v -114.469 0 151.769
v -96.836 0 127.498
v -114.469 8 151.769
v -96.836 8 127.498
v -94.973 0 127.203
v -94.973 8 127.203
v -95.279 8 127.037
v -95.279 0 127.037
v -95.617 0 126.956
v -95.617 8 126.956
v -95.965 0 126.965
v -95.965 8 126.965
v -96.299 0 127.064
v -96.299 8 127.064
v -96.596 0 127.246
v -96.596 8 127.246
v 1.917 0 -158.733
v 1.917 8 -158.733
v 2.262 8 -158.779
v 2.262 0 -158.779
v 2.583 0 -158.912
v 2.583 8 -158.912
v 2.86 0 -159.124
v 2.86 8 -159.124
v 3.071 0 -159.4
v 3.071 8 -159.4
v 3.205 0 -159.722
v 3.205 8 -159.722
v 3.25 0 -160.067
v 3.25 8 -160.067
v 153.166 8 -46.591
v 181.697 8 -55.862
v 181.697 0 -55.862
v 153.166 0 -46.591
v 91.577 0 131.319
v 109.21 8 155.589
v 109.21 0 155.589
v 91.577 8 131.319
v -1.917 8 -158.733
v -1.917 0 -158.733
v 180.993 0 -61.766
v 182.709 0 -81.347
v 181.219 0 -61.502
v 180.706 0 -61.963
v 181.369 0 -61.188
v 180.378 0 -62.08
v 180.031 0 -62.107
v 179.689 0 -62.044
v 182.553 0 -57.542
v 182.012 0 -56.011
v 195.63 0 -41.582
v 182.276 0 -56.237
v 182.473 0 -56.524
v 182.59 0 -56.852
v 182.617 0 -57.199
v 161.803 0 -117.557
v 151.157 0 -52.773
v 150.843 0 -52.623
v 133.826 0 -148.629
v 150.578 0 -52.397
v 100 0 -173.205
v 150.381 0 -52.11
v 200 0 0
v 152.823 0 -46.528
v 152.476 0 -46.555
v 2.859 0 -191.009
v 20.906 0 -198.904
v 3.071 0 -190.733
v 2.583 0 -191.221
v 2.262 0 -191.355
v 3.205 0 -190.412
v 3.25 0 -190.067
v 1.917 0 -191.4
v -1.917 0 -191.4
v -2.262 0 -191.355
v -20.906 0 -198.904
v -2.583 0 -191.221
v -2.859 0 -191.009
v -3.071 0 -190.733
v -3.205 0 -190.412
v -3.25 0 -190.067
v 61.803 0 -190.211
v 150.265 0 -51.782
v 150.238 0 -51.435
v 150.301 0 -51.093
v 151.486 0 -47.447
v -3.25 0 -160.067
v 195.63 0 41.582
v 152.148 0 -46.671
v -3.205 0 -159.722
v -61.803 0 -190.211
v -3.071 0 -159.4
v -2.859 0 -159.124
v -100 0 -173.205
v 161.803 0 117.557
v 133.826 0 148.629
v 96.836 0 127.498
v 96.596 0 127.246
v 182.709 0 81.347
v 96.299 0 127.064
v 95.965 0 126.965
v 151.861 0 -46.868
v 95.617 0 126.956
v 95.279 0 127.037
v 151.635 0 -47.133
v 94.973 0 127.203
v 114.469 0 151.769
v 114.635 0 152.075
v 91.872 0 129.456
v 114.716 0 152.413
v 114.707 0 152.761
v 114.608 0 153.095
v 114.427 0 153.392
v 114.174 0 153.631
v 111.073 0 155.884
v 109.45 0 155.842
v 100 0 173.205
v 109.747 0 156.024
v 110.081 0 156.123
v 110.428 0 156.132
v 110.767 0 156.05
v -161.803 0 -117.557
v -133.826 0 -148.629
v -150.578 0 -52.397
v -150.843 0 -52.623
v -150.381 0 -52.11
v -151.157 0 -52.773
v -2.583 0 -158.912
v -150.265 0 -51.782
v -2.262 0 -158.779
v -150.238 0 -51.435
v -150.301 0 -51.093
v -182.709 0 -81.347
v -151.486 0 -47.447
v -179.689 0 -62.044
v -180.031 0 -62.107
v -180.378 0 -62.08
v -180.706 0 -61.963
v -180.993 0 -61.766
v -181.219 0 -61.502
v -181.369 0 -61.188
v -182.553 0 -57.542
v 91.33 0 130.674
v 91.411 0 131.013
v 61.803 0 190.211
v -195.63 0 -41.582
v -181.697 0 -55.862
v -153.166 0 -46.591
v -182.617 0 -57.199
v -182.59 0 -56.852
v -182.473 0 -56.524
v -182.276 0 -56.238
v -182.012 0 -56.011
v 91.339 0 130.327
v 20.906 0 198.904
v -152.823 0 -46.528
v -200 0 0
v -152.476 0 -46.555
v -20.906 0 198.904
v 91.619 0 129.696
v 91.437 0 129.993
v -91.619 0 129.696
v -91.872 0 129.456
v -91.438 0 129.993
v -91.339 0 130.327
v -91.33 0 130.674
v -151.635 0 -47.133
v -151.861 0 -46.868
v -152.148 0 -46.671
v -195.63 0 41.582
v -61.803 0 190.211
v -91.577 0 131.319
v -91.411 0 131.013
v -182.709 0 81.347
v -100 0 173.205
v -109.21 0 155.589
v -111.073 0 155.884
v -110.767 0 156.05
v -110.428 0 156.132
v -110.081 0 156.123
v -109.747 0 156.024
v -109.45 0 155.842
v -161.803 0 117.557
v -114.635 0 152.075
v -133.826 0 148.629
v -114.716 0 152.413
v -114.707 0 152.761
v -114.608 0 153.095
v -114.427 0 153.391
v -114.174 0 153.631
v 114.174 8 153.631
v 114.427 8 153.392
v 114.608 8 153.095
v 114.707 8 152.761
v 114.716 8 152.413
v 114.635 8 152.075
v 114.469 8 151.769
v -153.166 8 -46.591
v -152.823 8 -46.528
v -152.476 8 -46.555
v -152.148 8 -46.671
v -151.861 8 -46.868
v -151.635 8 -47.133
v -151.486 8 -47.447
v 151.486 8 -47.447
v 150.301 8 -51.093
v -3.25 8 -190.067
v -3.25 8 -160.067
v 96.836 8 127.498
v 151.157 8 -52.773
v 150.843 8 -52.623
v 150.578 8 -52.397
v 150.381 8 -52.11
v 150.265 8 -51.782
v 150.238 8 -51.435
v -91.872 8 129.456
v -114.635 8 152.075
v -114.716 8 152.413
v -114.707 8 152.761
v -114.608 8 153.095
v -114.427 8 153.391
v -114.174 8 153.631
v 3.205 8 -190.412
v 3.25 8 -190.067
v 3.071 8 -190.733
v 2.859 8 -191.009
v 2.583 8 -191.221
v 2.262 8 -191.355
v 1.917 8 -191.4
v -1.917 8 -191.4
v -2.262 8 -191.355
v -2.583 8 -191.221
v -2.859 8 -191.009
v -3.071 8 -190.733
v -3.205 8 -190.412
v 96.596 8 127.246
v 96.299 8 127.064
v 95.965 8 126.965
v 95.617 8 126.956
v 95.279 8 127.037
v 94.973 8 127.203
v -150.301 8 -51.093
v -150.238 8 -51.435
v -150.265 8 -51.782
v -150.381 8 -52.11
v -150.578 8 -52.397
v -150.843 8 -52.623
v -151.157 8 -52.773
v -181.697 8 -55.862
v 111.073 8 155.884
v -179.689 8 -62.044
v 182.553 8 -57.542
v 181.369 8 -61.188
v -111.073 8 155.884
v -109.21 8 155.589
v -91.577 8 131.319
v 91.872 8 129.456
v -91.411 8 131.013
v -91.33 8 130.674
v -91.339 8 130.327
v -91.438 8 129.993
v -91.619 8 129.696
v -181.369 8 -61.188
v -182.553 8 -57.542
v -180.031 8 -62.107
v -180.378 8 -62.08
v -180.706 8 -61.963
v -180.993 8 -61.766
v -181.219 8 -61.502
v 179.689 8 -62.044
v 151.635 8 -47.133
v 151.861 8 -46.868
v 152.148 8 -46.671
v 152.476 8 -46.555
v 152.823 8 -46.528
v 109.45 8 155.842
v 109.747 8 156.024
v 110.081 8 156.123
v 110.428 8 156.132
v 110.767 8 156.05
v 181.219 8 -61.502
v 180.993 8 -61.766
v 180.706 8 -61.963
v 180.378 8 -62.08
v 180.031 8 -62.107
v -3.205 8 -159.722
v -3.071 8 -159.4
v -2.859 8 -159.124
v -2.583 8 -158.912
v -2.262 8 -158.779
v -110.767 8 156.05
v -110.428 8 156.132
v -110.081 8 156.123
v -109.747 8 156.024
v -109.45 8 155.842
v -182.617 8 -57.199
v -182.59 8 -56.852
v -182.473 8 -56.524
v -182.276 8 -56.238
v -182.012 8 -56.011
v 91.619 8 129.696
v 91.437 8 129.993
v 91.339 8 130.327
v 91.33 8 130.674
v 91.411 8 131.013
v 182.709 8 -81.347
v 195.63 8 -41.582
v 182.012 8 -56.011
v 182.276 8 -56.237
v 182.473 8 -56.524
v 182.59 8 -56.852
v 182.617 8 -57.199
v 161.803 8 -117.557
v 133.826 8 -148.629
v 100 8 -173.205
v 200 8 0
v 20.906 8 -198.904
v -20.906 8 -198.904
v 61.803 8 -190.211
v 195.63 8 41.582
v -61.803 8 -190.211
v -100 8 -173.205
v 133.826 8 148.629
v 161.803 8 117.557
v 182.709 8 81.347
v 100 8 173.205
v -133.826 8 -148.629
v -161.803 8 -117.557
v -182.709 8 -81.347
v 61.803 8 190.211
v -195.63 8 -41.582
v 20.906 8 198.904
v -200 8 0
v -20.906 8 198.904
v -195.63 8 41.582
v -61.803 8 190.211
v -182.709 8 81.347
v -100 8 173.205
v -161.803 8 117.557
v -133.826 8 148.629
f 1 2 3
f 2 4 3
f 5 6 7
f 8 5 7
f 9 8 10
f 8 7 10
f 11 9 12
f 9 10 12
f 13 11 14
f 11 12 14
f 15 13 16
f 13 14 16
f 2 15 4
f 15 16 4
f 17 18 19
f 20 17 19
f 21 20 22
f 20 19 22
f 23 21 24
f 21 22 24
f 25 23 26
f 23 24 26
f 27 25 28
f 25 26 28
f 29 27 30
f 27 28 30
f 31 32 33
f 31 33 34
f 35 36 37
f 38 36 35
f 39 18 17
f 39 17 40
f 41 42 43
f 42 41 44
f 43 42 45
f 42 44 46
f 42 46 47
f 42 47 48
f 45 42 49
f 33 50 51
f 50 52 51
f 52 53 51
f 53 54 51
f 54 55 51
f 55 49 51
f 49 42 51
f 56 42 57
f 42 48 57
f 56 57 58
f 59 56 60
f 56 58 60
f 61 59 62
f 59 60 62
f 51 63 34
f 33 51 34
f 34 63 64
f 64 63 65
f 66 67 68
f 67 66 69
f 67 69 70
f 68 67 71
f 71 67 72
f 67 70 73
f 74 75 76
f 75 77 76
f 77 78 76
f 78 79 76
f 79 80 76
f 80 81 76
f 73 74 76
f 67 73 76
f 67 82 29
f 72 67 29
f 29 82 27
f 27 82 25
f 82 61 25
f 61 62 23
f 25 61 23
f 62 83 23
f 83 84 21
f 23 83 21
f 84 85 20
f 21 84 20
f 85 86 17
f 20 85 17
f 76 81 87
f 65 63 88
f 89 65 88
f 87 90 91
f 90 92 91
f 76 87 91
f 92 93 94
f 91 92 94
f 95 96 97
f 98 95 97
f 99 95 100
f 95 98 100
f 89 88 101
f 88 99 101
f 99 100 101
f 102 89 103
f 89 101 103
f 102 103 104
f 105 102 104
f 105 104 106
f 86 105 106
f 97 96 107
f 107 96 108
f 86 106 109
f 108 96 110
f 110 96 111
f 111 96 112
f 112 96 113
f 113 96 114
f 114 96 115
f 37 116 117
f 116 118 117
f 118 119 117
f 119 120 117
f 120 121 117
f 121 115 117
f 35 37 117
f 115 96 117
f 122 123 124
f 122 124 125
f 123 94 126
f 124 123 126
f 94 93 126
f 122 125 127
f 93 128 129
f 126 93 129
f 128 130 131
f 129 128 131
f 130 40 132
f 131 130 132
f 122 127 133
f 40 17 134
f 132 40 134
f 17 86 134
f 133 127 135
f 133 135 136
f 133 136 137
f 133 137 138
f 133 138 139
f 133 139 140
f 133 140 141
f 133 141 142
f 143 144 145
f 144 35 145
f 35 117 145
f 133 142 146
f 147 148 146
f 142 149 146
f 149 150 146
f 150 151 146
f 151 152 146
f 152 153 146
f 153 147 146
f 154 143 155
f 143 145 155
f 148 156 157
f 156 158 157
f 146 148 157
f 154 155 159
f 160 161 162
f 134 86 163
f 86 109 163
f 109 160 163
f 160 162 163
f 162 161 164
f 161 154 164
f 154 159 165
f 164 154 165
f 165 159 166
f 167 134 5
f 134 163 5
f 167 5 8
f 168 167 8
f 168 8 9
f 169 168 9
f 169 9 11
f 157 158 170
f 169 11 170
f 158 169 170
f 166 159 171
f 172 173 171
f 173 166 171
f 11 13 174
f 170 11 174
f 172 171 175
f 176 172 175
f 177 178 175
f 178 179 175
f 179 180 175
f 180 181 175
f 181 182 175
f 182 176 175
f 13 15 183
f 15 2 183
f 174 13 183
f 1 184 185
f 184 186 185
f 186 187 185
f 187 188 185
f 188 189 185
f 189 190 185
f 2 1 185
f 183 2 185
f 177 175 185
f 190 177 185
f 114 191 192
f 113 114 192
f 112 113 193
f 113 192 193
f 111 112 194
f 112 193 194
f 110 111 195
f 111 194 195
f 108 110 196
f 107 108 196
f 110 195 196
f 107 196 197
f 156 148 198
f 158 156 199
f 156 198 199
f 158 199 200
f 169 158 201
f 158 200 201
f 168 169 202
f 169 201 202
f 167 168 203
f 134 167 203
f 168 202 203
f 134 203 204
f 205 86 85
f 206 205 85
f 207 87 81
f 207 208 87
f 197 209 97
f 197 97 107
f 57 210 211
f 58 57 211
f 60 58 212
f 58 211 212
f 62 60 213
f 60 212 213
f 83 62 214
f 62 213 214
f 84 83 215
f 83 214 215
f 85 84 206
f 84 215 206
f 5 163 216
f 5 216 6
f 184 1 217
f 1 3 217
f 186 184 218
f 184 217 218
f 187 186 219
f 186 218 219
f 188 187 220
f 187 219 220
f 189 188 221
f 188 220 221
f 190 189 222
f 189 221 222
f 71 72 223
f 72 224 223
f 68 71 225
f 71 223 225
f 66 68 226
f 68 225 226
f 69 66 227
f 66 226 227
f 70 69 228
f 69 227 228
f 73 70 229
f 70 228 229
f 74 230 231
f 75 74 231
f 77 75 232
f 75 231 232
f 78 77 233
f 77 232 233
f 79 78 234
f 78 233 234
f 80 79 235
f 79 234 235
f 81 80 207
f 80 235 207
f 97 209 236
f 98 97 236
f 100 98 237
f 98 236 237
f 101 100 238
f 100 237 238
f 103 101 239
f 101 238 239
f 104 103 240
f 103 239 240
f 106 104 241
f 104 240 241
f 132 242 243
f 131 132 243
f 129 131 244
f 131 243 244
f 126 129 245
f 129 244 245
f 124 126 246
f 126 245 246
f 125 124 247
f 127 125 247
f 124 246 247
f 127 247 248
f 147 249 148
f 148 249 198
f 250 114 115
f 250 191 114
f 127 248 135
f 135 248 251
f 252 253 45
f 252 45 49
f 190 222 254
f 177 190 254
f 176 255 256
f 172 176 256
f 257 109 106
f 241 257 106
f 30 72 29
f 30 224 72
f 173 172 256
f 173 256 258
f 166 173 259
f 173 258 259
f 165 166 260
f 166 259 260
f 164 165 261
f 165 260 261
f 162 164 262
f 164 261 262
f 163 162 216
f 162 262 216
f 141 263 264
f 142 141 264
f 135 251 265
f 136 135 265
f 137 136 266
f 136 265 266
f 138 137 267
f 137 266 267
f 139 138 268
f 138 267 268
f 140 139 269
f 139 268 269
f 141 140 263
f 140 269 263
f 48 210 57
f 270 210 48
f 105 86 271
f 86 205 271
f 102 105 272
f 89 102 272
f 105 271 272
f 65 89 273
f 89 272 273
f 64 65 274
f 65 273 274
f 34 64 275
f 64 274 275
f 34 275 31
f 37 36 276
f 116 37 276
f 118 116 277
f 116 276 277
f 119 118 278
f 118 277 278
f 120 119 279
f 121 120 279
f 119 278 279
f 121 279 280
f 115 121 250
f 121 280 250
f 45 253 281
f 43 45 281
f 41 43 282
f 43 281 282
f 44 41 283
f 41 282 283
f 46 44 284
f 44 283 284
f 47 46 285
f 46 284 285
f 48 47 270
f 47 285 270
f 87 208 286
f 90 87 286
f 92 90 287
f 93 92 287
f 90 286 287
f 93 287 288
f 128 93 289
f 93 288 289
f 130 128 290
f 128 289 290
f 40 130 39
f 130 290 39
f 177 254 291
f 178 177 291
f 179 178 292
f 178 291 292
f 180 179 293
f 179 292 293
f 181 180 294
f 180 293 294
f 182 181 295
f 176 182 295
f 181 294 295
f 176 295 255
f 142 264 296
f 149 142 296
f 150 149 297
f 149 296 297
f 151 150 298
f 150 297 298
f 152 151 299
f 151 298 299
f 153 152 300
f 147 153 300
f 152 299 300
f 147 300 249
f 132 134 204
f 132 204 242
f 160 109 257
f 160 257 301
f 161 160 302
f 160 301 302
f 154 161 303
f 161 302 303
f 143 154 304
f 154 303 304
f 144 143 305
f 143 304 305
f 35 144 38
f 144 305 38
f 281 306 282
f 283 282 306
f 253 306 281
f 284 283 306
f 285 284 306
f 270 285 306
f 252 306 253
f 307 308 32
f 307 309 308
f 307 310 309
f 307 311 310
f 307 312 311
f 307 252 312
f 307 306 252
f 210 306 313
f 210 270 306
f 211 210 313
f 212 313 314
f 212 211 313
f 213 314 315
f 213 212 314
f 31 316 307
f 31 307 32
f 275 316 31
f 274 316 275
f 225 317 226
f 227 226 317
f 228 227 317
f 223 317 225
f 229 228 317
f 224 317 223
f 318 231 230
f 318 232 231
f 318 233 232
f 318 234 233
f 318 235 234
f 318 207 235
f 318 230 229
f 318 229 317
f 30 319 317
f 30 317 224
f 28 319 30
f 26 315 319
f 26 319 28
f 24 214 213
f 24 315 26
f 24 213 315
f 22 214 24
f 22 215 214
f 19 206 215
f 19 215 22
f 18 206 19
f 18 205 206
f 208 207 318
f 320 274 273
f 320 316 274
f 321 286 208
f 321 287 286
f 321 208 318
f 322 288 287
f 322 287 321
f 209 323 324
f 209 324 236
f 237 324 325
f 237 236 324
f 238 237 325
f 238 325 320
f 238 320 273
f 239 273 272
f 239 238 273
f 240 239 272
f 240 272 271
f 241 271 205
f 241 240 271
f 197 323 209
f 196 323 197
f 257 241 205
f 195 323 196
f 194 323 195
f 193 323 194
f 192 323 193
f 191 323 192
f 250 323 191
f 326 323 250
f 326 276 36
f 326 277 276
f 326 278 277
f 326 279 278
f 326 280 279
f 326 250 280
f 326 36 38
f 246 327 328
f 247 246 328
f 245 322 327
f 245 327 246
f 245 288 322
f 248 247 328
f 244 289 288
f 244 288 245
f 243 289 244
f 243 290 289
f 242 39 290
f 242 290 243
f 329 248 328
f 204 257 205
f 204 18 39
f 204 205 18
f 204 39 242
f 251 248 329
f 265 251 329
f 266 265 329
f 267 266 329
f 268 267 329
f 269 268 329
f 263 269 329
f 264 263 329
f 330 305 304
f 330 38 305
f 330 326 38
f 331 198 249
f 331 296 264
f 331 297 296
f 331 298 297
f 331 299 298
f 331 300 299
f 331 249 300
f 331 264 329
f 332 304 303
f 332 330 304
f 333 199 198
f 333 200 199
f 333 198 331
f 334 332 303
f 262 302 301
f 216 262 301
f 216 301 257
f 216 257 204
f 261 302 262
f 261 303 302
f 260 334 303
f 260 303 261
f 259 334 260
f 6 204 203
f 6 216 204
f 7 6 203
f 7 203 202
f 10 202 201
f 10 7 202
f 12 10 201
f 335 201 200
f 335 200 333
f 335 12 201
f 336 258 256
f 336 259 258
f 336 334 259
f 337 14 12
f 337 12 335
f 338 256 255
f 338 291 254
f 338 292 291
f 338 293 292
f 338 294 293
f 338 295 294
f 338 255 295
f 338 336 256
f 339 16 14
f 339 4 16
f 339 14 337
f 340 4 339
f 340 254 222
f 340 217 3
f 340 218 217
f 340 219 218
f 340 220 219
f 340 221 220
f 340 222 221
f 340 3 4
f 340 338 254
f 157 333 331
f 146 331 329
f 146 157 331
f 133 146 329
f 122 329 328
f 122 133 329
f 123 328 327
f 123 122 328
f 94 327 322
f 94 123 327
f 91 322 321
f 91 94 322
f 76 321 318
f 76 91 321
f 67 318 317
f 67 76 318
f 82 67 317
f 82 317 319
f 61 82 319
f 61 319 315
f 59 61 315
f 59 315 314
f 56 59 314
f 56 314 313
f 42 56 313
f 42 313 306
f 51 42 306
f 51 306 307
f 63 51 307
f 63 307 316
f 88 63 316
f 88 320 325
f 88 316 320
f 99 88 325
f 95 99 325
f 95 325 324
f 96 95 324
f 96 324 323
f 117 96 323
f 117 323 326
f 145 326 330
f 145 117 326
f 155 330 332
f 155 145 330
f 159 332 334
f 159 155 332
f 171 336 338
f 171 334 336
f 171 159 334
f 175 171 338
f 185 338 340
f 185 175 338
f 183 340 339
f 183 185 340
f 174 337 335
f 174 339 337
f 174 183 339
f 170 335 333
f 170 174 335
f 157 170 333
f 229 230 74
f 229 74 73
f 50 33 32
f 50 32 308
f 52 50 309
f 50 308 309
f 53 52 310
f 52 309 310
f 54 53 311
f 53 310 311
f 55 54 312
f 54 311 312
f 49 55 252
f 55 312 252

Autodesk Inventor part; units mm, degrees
ref_plane "YZ Plane" through (0, 0, 0) normal (1, 0, 0) x (0, 1, 0)
ref_plane "XZ Plane" through (0, 0, 0) normal (0, 1, 0) x (-1, 0, 0)
ref_plane "XY Plane" through (0, 0, 0) normal (0, 0, 1) x (1, 0, 0)
sketch "Sketch1" plane through (0, 0, 0) normal (0, 1, 0) x (-1, 0, 0)
  circle A0 centre (0, 0) radius 200
  dimension "d0" = 400
extrude "Extrusion1" add sketch "Sketch1" along normal blind 8
sketch "Sketch2" plane through (0, 8, 0) normal (0, 1, 0) x (1, 0, 0)
  line L0 (-1.9167, 191.4) -> (1.9167, 191.4)
  line L1 (3.25, 190.0667) -> (3.25, 160.0667)
  line L2 (1.9167, 158.7333) -> (-1.9167, 158.7333)
  line L3 (-3.25, 160.0667) -> (-3.25, 190.0667)
  circle A0 centre (0, 0) radius 200 projected
  arc A1 (-1.9167, 191.4) -> (-3.25, 190.0667) centre (-1.9167, 190.0667) ccw
  arc A2 (3.25, 190.0667) -> (1.9167, 191.4) centre (1.9167, 190.0667) ccw
  arc A3 (1.9167, 158.7333) -> (3.25, 160.0667) centre (1.9167, 160.0667) ccw
  arc A4 (-3.25, 160.0667) -> (-1.9167, 158.7333) centre (-1.9167, 160.0667) ccw
  line L4 (114.1741, -153.6311) -> (111.0728, -155.8843)
  line L5 (109.2104, -155.5893) -> (91.5769, -131.3188)
  line L6 (91.8718, -129.4564) -> (94.9731, -127.2032)
  line L7 (96.8355, -127.4982) -> (114.469, -151.7687)
  arc A5 (114.1741, -153.6311) -> (114.469, -151.7687) centre (113.3904, -152.5524) ccw
  arc A6 (109.2104, -155.5893) -> (111.0728, -155.8843) centre (110.2891, -154.8056) ccw
  arc A7 (91.8718, -129.4564) -> (91.5769, -131.3188) centre (92.6556, -130.5351) ccw
  arc A8 (96.8355, -127.4982) -> (94.9731, -127.2032) centre (95.7568, -128.2819) ccw
  line L8 (181.3689, 61.1875) -> (182.5534, 57.5417)
  line L9 (181.6974, 55.8616) -> (153.1657, 46.5911)
  line L10 (151.4856, 47.4472) -> (150.301, 51.0929)
  line L11 (151.1571, 52.773) -> (179.6888, 62.0435)
  arc A9 (181.3689, 61.1875) -> (179.6888, 62.0435) centre (180.1008, 60.7754) ccw
  arc A10 (181.6974, 55.8616) -> (182.5534, 57.5417) centre (181.2854, 57.1297) ccw
  arc A11 (151.4856, 47.4472) -> (153.1657, 46.5911) centre (152.7537, 47.8592) ccw
  arc A12 (151.1571, 52.773) -> (150.301, 51.0929) centre (151.5691, 51.5049) ccw
  line L12 (-114.1741, -153.6311) -> (-111.0728, -155.8843)
  line L13 (-109.2104, -155.5893) -> (-91.5769, -131.3188)
  line L14 (-91.8718, -129.4564) -> (-94.9731, -127.2032)
  line L15 (-96.8355, -127.4982) -> (-114.469, -151.7687)
  arc A13 (-114.469, -151.7687) -> (-114.1741, -153.6311) centre (-113.3904, -152.5524) ccw
  arc A14 (-111.0728, -155.8843) -> (-109.2104, -155.5893) centre (-110.2891, -154.8056) ccw
  arc A15 (-91.5769, -131.3188) -> (-91.8718, -129.4564) centre (-92.6556, -130.5351) ccw
  arc A16 (-94.9731, -127.2032) -> (-96.8355, -127.4982) centre (-95.7568, -128.2819) ccw
  line L16 (-181.3689, 61.1875) -> (-182.5534, 57.5417)
  line L17 (-181.6974, 55.8616) -> (-153.1657, 46.5911)
  line L18 (-151.4856, 47.4472) -> (-150.301, 51.0929)
  line L19 (-151.1571, 52.773) -> (-179.6888, 62.0435)
  arc A17 (-179.6888, 62.0435) -> (-181.3689, 61.1875) centre (-180.1008, 60.7754) ccw
  arc A18 (-182.5534, 57.5417) -> (-181.6974, 55.8616) centre (-181.2854, 57.1297) ccw
  arc A19 (-153.1657, 46.5911) -> (-151.4856, 47.4472) centre (-152.7537, 47.8592) ccw
  arc A20 (-150.301, 51.0929) -> (-151.1571, 52.773) centre (-151.5691, 51.5049) ccw
  dimension "d3" = 191.4
  dimension "d4" = 6.5
  dimension "d6" = 1.3333
  dimension "d7" = 30
extrude "Extrusion2" cut sketch "Sketch2" against normal through all contours L0 A2 L1 A3 L2 A4 L3 A1 | L4 A6 L5 A7 L6 A8 L7 A5 | L8 A10 L9 A11 L10 A12 L11 A9 | A13 L15 A16 L14 A15 L13 A14 L12 | A17 L19 A20 L18 A19 L17 A18 L16
equation "\"BendRadius\" = Thickness"
equation "\"BendReliefWidth\" = Thickness"
equation "\"BendReliefDepth\" = 0.5 * Thickness"
equation "\"CornerReliefSize\" = 4 * Thickness"
equation "\"MinimumRemnant\" = 2 * Thickness"
equation "\"TransitionRadius\" = BendRadius"
equation "\"JacobiRadiusSize\" = BendRadius"
equation "\"GapSize\" = Thickness"
equation "\"Thickness\" = 0.5"
properties part number "fINAL Roof - G" material "Wood (Maple)"
